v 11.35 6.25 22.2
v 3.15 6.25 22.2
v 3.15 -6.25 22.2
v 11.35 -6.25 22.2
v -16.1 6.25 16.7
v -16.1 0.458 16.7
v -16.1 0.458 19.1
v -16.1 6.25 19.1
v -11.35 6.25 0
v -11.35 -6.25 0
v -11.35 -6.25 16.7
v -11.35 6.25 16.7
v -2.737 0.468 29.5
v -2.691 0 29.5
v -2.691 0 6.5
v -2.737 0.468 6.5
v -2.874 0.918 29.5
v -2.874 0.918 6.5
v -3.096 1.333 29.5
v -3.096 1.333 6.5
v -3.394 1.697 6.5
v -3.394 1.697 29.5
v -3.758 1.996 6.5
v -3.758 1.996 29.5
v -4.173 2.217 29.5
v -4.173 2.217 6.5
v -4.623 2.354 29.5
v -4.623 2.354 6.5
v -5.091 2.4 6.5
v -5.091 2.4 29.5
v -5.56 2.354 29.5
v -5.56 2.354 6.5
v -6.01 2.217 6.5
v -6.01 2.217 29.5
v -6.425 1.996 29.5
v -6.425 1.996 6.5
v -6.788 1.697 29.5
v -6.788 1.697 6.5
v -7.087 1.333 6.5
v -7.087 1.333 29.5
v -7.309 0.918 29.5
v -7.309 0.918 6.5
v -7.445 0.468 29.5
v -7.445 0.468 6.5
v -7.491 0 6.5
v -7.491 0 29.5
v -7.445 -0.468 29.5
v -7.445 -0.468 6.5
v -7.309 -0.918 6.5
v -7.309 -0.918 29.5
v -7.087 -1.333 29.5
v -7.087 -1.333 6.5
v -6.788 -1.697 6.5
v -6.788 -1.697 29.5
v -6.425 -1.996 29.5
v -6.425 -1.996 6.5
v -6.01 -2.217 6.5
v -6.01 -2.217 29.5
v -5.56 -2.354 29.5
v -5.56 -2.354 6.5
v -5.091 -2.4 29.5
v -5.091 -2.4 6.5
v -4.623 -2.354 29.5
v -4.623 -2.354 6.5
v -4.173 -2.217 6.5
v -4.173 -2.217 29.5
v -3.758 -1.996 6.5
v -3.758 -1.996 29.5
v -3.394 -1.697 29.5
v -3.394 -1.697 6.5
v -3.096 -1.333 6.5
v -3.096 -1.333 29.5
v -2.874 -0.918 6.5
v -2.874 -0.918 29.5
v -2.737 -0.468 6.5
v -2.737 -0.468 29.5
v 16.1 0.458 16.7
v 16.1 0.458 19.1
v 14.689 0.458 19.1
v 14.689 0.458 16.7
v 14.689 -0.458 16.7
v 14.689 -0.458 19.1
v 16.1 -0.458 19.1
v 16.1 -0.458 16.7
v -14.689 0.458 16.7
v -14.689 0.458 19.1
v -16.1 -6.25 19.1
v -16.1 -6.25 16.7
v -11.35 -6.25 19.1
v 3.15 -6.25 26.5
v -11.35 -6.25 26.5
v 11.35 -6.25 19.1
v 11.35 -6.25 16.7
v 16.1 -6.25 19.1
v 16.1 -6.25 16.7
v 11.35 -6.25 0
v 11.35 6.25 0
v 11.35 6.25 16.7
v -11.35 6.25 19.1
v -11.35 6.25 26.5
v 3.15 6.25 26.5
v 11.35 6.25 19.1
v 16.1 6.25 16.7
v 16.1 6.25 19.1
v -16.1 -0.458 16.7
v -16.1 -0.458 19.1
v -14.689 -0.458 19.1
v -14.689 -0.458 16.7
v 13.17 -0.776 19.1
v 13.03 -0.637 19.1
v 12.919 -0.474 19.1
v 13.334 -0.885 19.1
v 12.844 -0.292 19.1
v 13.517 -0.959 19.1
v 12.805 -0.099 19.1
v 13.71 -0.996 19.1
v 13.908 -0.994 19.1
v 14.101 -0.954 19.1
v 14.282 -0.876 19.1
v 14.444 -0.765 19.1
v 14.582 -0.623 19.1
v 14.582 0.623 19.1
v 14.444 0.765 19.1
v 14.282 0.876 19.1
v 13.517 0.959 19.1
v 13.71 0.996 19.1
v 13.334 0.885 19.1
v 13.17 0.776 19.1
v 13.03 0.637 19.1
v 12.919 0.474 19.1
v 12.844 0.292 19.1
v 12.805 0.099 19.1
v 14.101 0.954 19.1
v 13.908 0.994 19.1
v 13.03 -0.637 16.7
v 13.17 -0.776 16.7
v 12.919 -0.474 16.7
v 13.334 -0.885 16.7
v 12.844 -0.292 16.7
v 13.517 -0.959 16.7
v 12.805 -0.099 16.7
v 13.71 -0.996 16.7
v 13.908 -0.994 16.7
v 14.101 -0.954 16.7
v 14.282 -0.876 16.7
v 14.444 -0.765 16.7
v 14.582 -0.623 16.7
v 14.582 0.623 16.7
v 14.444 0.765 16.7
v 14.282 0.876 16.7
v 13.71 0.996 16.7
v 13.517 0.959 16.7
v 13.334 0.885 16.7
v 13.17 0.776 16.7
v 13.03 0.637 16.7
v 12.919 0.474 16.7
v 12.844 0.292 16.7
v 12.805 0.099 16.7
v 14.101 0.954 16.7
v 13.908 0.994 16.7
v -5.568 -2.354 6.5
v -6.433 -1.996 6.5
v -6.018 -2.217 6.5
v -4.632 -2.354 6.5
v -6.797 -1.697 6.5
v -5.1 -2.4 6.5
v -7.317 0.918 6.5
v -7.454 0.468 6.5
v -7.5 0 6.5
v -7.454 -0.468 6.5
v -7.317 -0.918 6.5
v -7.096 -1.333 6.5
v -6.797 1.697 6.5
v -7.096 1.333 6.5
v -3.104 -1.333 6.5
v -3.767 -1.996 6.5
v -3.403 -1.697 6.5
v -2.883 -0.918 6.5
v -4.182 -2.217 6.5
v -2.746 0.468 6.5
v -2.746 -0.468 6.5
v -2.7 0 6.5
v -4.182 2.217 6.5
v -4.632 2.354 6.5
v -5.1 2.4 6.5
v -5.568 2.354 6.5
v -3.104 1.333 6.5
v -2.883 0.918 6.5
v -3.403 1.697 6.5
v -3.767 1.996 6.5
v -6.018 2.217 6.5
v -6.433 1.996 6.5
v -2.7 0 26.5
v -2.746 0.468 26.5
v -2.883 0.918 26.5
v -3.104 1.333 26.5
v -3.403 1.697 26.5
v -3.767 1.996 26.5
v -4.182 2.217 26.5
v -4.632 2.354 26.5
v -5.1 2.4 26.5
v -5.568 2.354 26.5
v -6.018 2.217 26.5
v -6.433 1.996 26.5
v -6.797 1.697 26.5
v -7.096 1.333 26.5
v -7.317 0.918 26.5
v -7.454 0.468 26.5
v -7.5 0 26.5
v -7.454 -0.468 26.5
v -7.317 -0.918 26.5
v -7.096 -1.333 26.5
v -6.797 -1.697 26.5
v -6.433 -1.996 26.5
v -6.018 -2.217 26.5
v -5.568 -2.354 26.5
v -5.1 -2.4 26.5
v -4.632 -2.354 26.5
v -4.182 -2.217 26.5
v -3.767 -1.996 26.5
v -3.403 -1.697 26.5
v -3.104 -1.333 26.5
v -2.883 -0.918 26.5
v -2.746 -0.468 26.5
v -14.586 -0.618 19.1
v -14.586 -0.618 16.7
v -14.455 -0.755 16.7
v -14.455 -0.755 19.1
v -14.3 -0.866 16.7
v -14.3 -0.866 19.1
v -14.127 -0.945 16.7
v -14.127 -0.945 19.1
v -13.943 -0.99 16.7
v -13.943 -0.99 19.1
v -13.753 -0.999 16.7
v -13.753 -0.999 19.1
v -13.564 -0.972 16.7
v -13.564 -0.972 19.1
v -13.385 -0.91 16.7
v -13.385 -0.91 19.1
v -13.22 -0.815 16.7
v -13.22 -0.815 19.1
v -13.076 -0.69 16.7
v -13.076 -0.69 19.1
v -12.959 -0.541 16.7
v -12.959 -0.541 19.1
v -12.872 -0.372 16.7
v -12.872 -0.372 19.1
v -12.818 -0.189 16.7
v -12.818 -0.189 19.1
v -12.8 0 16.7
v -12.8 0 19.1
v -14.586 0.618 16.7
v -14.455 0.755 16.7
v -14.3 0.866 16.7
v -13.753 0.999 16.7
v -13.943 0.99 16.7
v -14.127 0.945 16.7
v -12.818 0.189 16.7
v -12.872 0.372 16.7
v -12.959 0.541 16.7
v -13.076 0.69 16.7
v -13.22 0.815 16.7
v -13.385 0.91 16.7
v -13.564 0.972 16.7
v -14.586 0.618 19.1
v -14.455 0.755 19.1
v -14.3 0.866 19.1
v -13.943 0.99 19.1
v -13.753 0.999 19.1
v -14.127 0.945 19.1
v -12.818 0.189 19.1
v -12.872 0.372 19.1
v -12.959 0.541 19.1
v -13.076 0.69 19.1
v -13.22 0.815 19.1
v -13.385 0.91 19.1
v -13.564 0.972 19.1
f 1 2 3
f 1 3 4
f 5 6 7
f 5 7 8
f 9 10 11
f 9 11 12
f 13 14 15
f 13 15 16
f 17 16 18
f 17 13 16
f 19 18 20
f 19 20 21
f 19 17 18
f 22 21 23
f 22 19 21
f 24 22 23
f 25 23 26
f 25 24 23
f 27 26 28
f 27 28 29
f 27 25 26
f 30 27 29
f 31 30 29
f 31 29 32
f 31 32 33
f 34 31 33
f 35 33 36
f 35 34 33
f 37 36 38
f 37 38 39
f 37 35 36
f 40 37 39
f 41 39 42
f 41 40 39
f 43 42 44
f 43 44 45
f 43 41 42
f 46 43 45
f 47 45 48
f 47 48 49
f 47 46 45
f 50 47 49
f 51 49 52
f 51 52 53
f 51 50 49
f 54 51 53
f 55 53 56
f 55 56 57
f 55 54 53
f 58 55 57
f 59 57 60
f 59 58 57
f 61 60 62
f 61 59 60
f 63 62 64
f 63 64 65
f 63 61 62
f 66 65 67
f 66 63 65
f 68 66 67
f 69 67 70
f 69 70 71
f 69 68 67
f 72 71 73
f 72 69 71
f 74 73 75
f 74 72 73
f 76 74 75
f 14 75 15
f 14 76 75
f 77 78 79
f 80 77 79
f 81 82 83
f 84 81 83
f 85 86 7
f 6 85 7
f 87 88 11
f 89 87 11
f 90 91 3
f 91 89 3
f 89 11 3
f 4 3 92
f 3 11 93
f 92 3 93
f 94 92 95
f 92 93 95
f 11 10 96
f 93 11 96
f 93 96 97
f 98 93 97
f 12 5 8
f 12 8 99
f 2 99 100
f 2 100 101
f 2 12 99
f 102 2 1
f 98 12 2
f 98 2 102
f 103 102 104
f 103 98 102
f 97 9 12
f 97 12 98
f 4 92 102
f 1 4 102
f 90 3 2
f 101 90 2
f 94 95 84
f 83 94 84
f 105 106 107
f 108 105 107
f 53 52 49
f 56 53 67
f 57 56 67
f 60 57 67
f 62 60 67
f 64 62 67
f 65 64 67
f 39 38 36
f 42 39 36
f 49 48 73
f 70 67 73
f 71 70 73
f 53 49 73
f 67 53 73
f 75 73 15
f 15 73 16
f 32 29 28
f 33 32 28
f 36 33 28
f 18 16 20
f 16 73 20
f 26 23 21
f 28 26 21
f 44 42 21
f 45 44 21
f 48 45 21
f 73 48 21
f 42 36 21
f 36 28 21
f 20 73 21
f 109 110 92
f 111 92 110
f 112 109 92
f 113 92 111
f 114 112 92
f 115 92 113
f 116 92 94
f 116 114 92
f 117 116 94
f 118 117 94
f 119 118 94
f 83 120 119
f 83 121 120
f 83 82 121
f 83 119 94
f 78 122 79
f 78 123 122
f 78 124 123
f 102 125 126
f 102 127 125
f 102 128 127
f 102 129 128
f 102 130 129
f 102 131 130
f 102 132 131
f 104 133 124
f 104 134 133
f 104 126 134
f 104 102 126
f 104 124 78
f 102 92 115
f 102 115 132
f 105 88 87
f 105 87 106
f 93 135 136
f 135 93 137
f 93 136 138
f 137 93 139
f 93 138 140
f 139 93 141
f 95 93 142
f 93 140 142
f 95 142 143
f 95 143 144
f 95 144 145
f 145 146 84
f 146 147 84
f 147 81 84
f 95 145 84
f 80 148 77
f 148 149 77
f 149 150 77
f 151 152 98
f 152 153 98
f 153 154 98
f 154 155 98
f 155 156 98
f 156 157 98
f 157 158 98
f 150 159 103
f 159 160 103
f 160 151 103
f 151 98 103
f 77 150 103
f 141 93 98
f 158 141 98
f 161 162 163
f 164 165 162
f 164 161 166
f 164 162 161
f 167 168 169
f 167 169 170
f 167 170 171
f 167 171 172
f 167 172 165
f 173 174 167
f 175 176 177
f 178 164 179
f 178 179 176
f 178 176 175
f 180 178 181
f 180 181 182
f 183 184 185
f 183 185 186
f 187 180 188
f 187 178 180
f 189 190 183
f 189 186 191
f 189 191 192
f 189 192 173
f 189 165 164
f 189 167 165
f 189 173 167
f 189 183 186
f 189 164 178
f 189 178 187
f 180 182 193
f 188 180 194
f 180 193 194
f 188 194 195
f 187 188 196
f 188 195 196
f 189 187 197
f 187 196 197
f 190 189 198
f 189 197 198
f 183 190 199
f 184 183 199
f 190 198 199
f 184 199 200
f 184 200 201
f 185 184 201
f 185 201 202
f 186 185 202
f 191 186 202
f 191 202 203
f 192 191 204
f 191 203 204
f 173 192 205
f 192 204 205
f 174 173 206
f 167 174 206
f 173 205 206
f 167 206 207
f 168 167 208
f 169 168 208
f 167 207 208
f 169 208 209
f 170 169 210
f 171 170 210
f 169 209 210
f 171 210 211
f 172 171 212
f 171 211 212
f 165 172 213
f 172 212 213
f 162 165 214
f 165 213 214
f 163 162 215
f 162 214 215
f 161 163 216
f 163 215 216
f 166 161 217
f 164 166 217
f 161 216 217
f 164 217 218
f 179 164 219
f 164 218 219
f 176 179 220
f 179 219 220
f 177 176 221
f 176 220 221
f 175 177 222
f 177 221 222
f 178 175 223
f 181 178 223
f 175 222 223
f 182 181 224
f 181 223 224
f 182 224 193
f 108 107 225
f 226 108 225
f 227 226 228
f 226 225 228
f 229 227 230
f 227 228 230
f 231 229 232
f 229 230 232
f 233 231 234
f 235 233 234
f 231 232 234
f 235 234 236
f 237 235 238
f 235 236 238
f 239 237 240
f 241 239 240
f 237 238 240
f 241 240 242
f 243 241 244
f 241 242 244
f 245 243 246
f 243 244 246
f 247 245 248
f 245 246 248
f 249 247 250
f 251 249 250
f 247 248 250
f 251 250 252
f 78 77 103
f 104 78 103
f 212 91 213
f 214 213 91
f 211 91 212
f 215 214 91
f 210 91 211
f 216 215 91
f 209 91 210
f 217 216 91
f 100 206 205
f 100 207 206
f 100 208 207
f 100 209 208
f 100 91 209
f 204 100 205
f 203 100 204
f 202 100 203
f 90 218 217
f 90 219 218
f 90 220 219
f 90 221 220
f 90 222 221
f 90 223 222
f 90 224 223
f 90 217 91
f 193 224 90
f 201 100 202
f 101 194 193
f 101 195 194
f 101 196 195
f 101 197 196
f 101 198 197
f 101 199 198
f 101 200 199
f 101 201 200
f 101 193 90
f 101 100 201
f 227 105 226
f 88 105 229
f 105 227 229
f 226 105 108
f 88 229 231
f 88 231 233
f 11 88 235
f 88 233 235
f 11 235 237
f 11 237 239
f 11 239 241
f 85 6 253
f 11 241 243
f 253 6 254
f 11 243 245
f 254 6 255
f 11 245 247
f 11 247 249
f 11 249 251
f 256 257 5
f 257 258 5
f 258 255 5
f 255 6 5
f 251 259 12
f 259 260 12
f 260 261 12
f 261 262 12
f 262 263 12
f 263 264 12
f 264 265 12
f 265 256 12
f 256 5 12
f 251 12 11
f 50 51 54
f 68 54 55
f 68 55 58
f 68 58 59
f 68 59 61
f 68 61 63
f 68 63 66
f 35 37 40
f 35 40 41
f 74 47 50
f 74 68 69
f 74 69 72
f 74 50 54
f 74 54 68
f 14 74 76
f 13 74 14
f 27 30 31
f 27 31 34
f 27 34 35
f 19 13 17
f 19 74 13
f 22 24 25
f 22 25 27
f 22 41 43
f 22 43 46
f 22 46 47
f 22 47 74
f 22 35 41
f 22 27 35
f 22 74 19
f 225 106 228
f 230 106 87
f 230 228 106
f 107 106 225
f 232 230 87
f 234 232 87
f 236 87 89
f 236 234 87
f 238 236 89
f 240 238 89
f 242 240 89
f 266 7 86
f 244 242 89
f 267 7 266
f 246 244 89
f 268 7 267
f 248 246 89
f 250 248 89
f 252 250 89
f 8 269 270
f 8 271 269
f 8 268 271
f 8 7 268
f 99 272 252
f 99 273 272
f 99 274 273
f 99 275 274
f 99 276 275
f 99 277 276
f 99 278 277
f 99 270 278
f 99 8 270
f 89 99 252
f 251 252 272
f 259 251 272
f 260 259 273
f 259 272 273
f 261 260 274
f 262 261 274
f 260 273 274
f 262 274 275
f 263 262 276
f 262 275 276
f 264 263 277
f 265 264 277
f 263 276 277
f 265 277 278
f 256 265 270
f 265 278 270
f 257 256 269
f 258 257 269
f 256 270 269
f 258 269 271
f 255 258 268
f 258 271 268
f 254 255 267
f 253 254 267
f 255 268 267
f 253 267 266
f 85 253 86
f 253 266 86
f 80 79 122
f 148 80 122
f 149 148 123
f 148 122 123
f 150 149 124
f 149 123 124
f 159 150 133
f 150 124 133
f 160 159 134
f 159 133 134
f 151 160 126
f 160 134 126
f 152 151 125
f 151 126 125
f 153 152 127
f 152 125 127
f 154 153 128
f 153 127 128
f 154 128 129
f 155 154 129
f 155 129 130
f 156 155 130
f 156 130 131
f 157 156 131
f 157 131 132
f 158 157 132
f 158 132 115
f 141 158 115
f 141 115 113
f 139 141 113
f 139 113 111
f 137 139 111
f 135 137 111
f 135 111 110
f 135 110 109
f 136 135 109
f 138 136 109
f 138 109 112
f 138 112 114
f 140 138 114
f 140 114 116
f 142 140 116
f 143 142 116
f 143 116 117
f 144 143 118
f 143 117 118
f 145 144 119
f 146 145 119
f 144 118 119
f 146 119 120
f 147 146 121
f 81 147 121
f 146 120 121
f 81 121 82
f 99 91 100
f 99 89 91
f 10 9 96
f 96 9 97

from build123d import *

# Parameters (mm, degrees)
F0_W      = 22.7
F0_H      = 12.5
F1_DEPTH  = 16.7
F2_W      = 32.2
F2_H      = 12.5
F3_DEPTH  = 2.4
F5_DEPTH  = 19.101
F6_DEPTH  = 22.2
F7_W      = 14.5
F7_H      = 12.5
F8_DEPTH  = 4.3
F12_R     = 2.4
F13_DEPTH = 20
F14_R     = 2.4
F15_DEPTH = 3
F16_DEPTH = 23


with BuildPart() as f1:
    # F0 (on Top) → F1 (new body)
    with BuildSketch(Plane.XY):
        Rectangle(F0_W, F0_H)
    extrude(amount=F1_DEPTH)

    # F2 (on face) → F3 (join)
    with BuildSketch(Plane.XY.offset(16.7)):
        Rectangle(F2_W, F2_H)
    extrude(amount=F3_DEPTH)

    # F4 (on face) → F5 (cut, through all)
    with BuildSketch(Plane.XY.offset(19.1)):
        with BuildLine():
            ThreePointArc((-14.6890426058, -0.4578244698), (-13.5644608374, -0.9718648583), (-12.8, 0))
            ThreePointArc((-12.8, 0), (-13.5644608374, 0.9718648583), (-14.6890426058, 0.4578244698))
            Line((-14.6890426058, 0.4578244698), (-13.5, 0.4578244698))
            Line((-13.5, 0.4578244698), (-13.5, -0.4578244698))
            Line((-13.5, -0.4578244698), (-14.6890426058, -0.4578244698))
        make_face()
        with BuildLine():
            Line((-13.5, 0.4578244698), (-14.6890426058, 0.4578244698))
            ThreePointArc((-14.6890426058, 0.4578244698), (-14.8, 0), (-14.6890426058, -0.4578244698))
            Line((-14.6890426058, -0.4578244698), (-13.5, -0.4578244698))
            Line((-13.5, -0.4578244698), (-13.5, 0.4578244698))
        make_face()
        with BuildLine():
            ThreePointArc((-14.6890426058, -0.4578244698), (-14.8, 0), (-14.6890426058, 0.4578244698))
            Line((-14.6890426058, 0.4578244698), (-16.1, 0.4578244698))
            Line((-16.1, 0.4578244698), (-16.1, -0.4578244698))
            Line((-16.1, -0.4578244698), (-14.6890426058, -0.4578244698))
        make_face()
        with BuildLine():
            Line((14.6890426058, 0.4578244698), (13.5, 0.4578244698))
            Line((13.5, 0.4578244698), (13.5, -0.4578244698))
            Line((13.5, -0.4578244698), (14.6890426058, -0.4578244698))
            ThreePointArc((14.6890426058, -0.4578244698), (14.7718648583, -0.2355391626), (14.8, 0))
            ThreePointArc((14.8, 0), (14.7718648583, 0.2355391626), (14.6890426058, 0.4578244698))
        make_face()
        with BuildLine():
            Line((13.5, -0.4578244698), (13.5, 0.4578244698))
            Line((13.5, 0.4578244698), (14.6890426058, 0.4578244698))
            ThreePointArc((14.6890426058, 0.4578244698), (12.8, 0), (14.6890426058, -0.4578244698))
            Line((14.6890426058, -0.4578244698), (13.5, -0.4578244698))
        make_face()
        with BuildLine():
            Line((16.1, 0.4578244698), (14.6890426058, 0.4578244698))
            ThreePointArc((14.6890426058, 0.4578244698), (14.7718648583, 0.2355391626), (14.8, 0))
            ThreePointArc((14.8, 0), (14.7718648583, -0.2355391626), (14.6890426058, -0.4578244698))
            Line((14.6890426058, -0.4578244698), (16.1, -0.4578244698))
            Line((16.1, -0.4578244698), (16.1, 0.4578244698))
        make_face()
    extrude(amount=-F5_DEPTH, mode=Mode.SUBTRACT)

    # F6 (add): a face of the model
    f6_faces = [f1.faces().sort_by_distance(p)[0] for p in [
        (0, 0, 0),
    ]]
    extrude(f6_faces, amount=-F6_DEPTH)

    # F7 (on face) → F8 (join)
    with BuildSketch(Plane.XY.offset(22.2)):
        with Locations((-4.1, 0)):
            Rectangle(F7_W, F7_H)
    extrude(amount=F8_DEPTH)


with BuildPart() as f10_1:
    # F10: copy of F1
    add(f1.part)


with BuildPart() as f1_1:
    add(f1.part)

    # F12 (on face) → F13 (cut)
    with BuildSketch(Plane.XY.offset(26.5)):
        with Locations((-5.1, 0)):
            Circle(F12_R)
    extrude(amount=-F13_DEPTH, mode=Mode.SUBTRACT)


with BuildPart() as f15:
    # F14 (on face) → F15 (new body)
    with BuildSketch(Plane.XY.offset(26.5)):
        with Locations((-5.0913058221, 0)):
            Circle(F14_R)
    extrude(amount=F15_DEPTH)


with BuildPart() as f16:
    # F16 (new): a face of the model
    f16_faces = [f15.part.faces().sort_by_distance(p)[0] for p in [
        (-5.0913058221, 0, 29.5),
    ]]
    extrude(f16_faces, amount=-F16_DEPTH)


solid = Compound([f1_1.part, f16.part])
